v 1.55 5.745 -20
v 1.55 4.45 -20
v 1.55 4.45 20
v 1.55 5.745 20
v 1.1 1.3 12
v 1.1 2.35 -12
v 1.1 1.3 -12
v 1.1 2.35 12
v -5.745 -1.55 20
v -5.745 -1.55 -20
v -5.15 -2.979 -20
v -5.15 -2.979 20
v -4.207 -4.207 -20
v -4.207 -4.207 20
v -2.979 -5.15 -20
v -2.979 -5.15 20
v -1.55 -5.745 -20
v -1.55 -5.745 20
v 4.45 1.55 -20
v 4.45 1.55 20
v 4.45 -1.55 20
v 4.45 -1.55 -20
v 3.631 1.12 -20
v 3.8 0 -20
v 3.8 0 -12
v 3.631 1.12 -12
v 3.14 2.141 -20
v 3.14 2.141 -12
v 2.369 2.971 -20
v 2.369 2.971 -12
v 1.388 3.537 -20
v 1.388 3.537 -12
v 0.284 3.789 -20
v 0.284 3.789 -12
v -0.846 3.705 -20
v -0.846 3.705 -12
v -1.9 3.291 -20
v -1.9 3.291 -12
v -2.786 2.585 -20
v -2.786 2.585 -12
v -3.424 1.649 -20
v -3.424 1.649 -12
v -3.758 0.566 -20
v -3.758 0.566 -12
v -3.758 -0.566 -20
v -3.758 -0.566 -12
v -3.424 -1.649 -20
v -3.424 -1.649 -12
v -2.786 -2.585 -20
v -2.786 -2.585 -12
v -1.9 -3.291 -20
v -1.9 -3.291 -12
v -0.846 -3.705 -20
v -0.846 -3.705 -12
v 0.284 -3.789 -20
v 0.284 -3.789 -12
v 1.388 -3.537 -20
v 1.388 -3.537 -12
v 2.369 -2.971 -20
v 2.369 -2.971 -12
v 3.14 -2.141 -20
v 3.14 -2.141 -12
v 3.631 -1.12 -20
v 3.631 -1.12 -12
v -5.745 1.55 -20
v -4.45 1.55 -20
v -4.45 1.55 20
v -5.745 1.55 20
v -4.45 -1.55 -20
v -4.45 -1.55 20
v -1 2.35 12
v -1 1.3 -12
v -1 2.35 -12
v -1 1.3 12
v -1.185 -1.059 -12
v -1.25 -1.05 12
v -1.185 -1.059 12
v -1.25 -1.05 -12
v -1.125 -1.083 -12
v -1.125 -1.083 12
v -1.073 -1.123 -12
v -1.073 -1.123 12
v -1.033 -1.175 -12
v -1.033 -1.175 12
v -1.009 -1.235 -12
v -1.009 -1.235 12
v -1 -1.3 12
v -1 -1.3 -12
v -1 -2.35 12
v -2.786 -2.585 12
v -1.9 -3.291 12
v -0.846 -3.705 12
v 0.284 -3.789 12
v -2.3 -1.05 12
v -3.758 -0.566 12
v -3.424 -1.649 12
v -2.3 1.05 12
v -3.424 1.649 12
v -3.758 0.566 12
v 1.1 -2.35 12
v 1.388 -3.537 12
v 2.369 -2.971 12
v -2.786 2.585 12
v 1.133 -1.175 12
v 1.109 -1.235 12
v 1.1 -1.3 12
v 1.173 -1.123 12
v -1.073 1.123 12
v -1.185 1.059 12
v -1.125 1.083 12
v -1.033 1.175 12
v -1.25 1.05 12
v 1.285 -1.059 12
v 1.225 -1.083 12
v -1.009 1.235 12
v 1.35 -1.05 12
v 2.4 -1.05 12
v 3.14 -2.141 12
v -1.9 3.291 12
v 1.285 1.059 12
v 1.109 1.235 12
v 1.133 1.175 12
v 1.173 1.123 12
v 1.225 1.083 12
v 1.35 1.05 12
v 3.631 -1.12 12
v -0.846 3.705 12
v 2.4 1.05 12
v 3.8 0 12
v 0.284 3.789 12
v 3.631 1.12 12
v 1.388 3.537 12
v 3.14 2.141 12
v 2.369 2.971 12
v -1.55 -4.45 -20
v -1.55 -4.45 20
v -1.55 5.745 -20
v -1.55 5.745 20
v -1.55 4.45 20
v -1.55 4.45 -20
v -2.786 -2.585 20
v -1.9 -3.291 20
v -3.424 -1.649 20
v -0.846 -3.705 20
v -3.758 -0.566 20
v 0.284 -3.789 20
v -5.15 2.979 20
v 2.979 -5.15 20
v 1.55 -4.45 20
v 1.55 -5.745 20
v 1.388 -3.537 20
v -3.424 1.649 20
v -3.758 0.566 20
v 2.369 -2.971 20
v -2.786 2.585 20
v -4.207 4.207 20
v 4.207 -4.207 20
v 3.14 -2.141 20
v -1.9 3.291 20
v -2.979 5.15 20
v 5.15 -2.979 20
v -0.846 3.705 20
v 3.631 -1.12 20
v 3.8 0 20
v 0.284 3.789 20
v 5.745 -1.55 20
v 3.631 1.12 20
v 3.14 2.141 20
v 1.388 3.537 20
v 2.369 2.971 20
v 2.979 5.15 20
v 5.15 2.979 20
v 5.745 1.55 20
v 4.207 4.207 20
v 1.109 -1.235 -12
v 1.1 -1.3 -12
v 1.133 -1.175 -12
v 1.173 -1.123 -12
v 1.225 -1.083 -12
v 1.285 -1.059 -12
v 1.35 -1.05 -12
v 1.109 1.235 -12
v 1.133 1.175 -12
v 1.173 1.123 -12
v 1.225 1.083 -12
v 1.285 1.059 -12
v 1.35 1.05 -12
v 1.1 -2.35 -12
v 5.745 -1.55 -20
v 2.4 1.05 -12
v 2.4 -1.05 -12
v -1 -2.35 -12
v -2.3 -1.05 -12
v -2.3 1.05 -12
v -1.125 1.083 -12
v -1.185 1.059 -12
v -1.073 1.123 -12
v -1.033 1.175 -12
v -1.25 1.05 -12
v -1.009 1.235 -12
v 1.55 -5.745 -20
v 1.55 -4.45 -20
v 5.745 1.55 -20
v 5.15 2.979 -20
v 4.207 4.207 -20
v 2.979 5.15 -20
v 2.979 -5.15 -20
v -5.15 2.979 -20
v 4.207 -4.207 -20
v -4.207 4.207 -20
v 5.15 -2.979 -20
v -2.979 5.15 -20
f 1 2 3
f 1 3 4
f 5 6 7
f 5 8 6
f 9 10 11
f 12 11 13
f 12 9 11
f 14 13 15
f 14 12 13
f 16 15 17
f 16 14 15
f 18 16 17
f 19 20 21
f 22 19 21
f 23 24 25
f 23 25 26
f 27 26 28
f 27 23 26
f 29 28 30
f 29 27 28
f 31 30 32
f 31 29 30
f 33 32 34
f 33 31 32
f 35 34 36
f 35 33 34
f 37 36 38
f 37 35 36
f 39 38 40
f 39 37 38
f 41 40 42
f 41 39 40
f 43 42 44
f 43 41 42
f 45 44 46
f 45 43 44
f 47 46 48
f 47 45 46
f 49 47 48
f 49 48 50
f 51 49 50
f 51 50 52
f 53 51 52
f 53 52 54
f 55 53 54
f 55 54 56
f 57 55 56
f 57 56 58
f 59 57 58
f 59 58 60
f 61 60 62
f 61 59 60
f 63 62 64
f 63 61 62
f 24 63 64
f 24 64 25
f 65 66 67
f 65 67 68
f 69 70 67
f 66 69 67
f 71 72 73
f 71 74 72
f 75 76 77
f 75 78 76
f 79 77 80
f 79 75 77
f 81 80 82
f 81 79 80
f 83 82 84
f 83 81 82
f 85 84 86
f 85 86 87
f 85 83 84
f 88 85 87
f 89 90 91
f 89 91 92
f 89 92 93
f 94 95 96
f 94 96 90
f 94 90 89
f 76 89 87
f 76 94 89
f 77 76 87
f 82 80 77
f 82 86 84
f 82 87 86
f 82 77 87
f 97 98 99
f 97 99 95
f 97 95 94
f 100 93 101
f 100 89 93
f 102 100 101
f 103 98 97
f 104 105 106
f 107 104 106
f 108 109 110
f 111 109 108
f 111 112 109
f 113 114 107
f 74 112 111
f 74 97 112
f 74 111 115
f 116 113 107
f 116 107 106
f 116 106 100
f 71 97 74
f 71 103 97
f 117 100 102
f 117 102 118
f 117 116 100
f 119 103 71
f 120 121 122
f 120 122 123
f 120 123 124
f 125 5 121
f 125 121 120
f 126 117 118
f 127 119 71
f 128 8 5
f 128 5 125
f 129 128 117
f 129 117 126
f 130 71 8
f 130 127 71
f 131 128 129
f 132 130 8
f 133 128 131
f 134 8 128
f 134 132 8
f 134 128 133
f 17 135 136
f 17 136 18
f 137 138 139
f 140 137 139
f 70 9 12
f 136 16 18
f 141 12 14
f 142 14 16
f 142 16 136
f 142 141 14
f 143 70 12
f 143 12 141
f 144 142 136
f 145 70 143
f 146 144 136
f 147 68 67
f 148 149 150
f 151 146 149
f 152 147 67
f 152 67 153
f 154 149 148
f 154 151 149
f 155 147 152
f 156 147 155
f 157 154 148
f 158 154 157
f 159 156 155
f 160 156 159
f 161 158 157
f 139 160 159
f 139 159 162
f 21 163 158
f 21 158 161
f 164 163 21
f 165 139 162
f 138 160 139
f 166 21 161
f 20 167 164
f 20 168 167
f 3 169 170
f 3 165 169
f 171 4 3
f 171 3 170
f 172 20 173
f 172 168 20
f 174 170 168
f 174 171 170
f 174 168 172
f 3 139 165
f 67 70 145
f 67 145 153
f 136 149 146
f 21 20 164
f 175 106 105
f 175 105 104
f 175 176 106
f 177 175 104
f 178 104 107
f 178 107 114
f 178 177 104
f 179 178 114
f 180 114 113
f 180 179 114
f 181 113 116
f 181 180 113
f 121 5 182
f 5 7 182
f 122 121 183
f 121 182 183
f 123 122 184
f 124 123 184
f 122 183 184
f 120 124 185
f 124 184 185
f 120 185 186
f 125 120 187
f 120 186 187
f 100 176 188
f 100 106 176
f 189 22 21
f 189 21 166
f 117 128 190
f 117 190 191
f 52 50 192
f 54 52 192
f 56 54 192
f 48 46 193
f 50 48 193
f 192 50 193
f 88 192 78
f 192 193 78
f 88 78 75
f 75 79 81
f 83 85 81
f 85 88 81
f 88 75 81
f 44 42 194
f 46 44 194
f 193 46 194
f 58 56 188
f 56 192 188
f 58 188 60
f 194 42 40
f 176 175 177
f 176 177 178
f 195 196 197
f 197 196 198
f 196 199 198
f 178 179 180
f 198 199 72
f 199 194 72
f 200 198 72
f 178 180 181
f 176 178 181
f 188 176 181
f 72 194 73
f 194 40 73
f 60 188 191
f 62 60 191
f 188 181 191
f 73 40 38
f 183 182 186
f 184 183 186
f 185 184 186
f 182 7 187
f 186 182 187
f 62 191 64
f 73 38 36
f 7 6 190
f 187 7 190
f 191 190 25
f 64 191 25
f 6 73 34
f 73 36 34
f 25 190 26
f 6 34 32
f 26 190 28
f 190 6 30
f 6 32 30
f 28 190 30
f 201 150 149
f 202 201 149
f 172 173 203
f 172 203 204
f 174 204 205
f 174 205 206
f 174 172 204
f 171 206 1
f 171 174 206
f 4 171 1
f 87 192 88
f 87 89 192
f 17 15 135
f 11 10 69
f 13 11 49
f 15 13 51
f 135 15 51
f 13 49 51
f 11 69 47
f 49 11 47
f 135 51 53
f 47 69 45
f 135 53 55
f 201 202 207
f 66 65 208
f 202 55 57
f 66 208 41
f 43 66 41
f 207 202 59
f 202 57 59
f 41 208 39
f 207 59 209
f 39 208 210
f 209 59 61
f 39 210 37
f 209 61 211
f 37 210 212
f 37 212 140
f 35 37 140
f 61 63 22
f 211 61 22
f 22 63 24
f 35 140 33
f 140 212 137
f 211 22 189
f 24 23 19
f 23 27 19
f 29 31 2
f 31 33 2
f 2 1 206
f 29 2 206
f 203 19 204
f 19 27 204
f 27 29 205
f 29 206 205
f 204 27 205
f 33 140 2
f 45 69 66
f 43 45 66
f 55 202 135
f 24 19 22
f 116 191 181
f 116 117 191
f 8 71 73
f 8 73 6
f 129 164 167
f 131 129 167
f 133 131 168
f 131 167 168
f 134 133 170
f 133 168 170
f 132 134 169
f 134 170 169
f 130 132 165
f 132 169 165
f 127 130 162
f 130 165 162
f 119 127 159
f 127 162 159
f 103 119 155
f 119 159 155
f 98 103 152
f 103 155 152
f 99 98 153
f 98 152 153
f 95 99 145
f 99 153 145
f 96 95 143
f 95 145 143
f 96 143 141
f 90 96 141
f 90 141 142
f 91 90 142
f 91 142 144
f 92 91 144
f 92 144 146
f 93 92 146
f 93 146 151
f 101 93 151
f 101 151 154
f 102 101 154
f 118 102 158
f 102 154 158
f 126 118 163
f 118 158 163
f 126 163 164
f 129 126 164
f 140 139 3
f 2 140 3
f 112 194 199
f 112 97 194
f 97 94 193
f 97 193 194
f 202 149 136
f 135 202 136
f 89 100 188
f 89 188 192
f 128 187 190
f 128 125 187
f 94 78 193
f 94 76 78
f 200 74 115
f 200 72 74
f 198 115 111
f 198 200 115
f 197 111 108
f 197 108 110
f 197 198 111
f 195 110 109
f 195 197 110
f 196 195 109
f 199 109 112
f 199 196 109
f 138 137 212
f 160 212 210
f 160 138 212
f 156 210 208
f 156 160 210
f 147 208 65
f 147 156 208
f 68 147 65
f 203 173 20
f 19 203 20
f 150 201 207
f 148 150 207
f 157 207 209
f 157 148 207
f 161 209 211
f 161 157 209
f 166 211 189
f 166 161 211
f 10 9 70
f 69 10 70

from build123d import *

# Parameters (mm, degrees)
SKETCH1_R           = 5.95
BOSS_EXTRUDE2_DEPTH = 20
CUT_EXTRUDE1_DEPTH  = 41.875481649
CUT_EXTRUDE3_DEPTH  = 41.875481649
SKETCH10_R          = 3.8
CUT_EXTRUDE4_DEPTH  = 8
FILLET2_R           = 0.25


with BuildPart() as part:
    # Sketch1 → Boss-Extrude2 (new, symmetric)
    with BuildSketch(Plane.XY):
        Circle(SKETCH1_R)
    extrude(amount=BOSS_EXTRUDE2_DEPTH, both=True)

    # Sketch8 → Cut-Extrude1 (cut, through all)
    with BuildSketch(Plane.XY.offset(20)):
        Polygon((1.1, 1.05), (2.4, 1.05), (2.4, -1.05), (1.1, -1.05), (1.1, -2.35), (-1, -2.35), (-1, -1.05), (-2.3, -1.05), (-2.3, 1.05), (-1, 1.05), (-1, 2.35), (1.1, 2.35), align=None)
    extrude(amount=-CUT_EXTRUDE1_DEPTH, mode=Mode.SUBTRACT)

    # Sketch9 → Cut-Extrude3 (cut, through all)
    with BuildSketch(Plane.XY.offset(20)):
        with BuildLine():
            ThreePointArc((1.55, 5.744562647), (0, 5.95), (-1.55, 5.744562647))
            Line((-1.55, 5.744562647), (-1.55, 4.45))
            Line((-1.55, 4.45), (1.55, 4.45))
            Line((1.55, 4.45), (1.55, 5.744562647))
        make_face()
        with BuildLine():
            ThreePointArc((5.95, 0), (5.898417065, 0.781777543), (5.744562647, 1.55))
            Line((5.744562647, 1.55), (4.45, 1.55))
            Line((4.45, 1.55), (4.45, -1.55))
            Line((4.45, -1.55), (5.744562647, -1.55))
            ThreePointArc((5.744562647, -1.55), (5.898417065, -0.781777543), (5.95, 0))
        make_face()
        with BuildLine():
            Line((-4.45, 1.55), (-5.744562647, 1.55))
            ThreePointArc((-5.744562647, 1.55), (-5.95, 0), (-5.744562647, -1.55))
            Line((-5.744562647, -1.55), (-4.45, -1.55))
            Line((-4.45, -1.55), (-4.45, 1.55))
        make_face()
        with BuildLine():
            Line((-1.55, -4.45), (-1.55, -5.744562647))
            ThreePointArc((-1.55, -5.744562647), (0, -5.95), (1.55, -5.744562647))
            Line((1.55, -5.744562647), (1.55, -4.45))
            Line((1.55, -4.45), (-1.55, -4.45))
        make_face()
    extrude(amount=-CUT_EXTRUDE3_DEPTH, mode=Mode.SUBTRACT)

    # Sketch10 → Cut-Extrude4 (cut)
    with BuildSketch(Plane.XY.offset(20)):
        Circle(SKETCH10_R)
    cut_extrude4 = extrude(amount=-CUT_EXTRUDE4_DEPTH, mode=Mode.SUBTRACT)

    # Mirror1: Cut-Extrude4 across plane
    add(cut_extrude4.mirror(Plane.XY), mode=Mode.SUBTRACT)

    # Fillet2
    fillet2_edges = [part.edges().sort_by_distance(p)[0] for p in [
        (1.1, -1.05, 0),
        (1.1, 1.05, 0),
        (-1, 1.05, 0),
        (-1, -1.05, 0),
    ]]
    fillet(fillet2_edges, radius=FILLET2_R)


solid = part.part
